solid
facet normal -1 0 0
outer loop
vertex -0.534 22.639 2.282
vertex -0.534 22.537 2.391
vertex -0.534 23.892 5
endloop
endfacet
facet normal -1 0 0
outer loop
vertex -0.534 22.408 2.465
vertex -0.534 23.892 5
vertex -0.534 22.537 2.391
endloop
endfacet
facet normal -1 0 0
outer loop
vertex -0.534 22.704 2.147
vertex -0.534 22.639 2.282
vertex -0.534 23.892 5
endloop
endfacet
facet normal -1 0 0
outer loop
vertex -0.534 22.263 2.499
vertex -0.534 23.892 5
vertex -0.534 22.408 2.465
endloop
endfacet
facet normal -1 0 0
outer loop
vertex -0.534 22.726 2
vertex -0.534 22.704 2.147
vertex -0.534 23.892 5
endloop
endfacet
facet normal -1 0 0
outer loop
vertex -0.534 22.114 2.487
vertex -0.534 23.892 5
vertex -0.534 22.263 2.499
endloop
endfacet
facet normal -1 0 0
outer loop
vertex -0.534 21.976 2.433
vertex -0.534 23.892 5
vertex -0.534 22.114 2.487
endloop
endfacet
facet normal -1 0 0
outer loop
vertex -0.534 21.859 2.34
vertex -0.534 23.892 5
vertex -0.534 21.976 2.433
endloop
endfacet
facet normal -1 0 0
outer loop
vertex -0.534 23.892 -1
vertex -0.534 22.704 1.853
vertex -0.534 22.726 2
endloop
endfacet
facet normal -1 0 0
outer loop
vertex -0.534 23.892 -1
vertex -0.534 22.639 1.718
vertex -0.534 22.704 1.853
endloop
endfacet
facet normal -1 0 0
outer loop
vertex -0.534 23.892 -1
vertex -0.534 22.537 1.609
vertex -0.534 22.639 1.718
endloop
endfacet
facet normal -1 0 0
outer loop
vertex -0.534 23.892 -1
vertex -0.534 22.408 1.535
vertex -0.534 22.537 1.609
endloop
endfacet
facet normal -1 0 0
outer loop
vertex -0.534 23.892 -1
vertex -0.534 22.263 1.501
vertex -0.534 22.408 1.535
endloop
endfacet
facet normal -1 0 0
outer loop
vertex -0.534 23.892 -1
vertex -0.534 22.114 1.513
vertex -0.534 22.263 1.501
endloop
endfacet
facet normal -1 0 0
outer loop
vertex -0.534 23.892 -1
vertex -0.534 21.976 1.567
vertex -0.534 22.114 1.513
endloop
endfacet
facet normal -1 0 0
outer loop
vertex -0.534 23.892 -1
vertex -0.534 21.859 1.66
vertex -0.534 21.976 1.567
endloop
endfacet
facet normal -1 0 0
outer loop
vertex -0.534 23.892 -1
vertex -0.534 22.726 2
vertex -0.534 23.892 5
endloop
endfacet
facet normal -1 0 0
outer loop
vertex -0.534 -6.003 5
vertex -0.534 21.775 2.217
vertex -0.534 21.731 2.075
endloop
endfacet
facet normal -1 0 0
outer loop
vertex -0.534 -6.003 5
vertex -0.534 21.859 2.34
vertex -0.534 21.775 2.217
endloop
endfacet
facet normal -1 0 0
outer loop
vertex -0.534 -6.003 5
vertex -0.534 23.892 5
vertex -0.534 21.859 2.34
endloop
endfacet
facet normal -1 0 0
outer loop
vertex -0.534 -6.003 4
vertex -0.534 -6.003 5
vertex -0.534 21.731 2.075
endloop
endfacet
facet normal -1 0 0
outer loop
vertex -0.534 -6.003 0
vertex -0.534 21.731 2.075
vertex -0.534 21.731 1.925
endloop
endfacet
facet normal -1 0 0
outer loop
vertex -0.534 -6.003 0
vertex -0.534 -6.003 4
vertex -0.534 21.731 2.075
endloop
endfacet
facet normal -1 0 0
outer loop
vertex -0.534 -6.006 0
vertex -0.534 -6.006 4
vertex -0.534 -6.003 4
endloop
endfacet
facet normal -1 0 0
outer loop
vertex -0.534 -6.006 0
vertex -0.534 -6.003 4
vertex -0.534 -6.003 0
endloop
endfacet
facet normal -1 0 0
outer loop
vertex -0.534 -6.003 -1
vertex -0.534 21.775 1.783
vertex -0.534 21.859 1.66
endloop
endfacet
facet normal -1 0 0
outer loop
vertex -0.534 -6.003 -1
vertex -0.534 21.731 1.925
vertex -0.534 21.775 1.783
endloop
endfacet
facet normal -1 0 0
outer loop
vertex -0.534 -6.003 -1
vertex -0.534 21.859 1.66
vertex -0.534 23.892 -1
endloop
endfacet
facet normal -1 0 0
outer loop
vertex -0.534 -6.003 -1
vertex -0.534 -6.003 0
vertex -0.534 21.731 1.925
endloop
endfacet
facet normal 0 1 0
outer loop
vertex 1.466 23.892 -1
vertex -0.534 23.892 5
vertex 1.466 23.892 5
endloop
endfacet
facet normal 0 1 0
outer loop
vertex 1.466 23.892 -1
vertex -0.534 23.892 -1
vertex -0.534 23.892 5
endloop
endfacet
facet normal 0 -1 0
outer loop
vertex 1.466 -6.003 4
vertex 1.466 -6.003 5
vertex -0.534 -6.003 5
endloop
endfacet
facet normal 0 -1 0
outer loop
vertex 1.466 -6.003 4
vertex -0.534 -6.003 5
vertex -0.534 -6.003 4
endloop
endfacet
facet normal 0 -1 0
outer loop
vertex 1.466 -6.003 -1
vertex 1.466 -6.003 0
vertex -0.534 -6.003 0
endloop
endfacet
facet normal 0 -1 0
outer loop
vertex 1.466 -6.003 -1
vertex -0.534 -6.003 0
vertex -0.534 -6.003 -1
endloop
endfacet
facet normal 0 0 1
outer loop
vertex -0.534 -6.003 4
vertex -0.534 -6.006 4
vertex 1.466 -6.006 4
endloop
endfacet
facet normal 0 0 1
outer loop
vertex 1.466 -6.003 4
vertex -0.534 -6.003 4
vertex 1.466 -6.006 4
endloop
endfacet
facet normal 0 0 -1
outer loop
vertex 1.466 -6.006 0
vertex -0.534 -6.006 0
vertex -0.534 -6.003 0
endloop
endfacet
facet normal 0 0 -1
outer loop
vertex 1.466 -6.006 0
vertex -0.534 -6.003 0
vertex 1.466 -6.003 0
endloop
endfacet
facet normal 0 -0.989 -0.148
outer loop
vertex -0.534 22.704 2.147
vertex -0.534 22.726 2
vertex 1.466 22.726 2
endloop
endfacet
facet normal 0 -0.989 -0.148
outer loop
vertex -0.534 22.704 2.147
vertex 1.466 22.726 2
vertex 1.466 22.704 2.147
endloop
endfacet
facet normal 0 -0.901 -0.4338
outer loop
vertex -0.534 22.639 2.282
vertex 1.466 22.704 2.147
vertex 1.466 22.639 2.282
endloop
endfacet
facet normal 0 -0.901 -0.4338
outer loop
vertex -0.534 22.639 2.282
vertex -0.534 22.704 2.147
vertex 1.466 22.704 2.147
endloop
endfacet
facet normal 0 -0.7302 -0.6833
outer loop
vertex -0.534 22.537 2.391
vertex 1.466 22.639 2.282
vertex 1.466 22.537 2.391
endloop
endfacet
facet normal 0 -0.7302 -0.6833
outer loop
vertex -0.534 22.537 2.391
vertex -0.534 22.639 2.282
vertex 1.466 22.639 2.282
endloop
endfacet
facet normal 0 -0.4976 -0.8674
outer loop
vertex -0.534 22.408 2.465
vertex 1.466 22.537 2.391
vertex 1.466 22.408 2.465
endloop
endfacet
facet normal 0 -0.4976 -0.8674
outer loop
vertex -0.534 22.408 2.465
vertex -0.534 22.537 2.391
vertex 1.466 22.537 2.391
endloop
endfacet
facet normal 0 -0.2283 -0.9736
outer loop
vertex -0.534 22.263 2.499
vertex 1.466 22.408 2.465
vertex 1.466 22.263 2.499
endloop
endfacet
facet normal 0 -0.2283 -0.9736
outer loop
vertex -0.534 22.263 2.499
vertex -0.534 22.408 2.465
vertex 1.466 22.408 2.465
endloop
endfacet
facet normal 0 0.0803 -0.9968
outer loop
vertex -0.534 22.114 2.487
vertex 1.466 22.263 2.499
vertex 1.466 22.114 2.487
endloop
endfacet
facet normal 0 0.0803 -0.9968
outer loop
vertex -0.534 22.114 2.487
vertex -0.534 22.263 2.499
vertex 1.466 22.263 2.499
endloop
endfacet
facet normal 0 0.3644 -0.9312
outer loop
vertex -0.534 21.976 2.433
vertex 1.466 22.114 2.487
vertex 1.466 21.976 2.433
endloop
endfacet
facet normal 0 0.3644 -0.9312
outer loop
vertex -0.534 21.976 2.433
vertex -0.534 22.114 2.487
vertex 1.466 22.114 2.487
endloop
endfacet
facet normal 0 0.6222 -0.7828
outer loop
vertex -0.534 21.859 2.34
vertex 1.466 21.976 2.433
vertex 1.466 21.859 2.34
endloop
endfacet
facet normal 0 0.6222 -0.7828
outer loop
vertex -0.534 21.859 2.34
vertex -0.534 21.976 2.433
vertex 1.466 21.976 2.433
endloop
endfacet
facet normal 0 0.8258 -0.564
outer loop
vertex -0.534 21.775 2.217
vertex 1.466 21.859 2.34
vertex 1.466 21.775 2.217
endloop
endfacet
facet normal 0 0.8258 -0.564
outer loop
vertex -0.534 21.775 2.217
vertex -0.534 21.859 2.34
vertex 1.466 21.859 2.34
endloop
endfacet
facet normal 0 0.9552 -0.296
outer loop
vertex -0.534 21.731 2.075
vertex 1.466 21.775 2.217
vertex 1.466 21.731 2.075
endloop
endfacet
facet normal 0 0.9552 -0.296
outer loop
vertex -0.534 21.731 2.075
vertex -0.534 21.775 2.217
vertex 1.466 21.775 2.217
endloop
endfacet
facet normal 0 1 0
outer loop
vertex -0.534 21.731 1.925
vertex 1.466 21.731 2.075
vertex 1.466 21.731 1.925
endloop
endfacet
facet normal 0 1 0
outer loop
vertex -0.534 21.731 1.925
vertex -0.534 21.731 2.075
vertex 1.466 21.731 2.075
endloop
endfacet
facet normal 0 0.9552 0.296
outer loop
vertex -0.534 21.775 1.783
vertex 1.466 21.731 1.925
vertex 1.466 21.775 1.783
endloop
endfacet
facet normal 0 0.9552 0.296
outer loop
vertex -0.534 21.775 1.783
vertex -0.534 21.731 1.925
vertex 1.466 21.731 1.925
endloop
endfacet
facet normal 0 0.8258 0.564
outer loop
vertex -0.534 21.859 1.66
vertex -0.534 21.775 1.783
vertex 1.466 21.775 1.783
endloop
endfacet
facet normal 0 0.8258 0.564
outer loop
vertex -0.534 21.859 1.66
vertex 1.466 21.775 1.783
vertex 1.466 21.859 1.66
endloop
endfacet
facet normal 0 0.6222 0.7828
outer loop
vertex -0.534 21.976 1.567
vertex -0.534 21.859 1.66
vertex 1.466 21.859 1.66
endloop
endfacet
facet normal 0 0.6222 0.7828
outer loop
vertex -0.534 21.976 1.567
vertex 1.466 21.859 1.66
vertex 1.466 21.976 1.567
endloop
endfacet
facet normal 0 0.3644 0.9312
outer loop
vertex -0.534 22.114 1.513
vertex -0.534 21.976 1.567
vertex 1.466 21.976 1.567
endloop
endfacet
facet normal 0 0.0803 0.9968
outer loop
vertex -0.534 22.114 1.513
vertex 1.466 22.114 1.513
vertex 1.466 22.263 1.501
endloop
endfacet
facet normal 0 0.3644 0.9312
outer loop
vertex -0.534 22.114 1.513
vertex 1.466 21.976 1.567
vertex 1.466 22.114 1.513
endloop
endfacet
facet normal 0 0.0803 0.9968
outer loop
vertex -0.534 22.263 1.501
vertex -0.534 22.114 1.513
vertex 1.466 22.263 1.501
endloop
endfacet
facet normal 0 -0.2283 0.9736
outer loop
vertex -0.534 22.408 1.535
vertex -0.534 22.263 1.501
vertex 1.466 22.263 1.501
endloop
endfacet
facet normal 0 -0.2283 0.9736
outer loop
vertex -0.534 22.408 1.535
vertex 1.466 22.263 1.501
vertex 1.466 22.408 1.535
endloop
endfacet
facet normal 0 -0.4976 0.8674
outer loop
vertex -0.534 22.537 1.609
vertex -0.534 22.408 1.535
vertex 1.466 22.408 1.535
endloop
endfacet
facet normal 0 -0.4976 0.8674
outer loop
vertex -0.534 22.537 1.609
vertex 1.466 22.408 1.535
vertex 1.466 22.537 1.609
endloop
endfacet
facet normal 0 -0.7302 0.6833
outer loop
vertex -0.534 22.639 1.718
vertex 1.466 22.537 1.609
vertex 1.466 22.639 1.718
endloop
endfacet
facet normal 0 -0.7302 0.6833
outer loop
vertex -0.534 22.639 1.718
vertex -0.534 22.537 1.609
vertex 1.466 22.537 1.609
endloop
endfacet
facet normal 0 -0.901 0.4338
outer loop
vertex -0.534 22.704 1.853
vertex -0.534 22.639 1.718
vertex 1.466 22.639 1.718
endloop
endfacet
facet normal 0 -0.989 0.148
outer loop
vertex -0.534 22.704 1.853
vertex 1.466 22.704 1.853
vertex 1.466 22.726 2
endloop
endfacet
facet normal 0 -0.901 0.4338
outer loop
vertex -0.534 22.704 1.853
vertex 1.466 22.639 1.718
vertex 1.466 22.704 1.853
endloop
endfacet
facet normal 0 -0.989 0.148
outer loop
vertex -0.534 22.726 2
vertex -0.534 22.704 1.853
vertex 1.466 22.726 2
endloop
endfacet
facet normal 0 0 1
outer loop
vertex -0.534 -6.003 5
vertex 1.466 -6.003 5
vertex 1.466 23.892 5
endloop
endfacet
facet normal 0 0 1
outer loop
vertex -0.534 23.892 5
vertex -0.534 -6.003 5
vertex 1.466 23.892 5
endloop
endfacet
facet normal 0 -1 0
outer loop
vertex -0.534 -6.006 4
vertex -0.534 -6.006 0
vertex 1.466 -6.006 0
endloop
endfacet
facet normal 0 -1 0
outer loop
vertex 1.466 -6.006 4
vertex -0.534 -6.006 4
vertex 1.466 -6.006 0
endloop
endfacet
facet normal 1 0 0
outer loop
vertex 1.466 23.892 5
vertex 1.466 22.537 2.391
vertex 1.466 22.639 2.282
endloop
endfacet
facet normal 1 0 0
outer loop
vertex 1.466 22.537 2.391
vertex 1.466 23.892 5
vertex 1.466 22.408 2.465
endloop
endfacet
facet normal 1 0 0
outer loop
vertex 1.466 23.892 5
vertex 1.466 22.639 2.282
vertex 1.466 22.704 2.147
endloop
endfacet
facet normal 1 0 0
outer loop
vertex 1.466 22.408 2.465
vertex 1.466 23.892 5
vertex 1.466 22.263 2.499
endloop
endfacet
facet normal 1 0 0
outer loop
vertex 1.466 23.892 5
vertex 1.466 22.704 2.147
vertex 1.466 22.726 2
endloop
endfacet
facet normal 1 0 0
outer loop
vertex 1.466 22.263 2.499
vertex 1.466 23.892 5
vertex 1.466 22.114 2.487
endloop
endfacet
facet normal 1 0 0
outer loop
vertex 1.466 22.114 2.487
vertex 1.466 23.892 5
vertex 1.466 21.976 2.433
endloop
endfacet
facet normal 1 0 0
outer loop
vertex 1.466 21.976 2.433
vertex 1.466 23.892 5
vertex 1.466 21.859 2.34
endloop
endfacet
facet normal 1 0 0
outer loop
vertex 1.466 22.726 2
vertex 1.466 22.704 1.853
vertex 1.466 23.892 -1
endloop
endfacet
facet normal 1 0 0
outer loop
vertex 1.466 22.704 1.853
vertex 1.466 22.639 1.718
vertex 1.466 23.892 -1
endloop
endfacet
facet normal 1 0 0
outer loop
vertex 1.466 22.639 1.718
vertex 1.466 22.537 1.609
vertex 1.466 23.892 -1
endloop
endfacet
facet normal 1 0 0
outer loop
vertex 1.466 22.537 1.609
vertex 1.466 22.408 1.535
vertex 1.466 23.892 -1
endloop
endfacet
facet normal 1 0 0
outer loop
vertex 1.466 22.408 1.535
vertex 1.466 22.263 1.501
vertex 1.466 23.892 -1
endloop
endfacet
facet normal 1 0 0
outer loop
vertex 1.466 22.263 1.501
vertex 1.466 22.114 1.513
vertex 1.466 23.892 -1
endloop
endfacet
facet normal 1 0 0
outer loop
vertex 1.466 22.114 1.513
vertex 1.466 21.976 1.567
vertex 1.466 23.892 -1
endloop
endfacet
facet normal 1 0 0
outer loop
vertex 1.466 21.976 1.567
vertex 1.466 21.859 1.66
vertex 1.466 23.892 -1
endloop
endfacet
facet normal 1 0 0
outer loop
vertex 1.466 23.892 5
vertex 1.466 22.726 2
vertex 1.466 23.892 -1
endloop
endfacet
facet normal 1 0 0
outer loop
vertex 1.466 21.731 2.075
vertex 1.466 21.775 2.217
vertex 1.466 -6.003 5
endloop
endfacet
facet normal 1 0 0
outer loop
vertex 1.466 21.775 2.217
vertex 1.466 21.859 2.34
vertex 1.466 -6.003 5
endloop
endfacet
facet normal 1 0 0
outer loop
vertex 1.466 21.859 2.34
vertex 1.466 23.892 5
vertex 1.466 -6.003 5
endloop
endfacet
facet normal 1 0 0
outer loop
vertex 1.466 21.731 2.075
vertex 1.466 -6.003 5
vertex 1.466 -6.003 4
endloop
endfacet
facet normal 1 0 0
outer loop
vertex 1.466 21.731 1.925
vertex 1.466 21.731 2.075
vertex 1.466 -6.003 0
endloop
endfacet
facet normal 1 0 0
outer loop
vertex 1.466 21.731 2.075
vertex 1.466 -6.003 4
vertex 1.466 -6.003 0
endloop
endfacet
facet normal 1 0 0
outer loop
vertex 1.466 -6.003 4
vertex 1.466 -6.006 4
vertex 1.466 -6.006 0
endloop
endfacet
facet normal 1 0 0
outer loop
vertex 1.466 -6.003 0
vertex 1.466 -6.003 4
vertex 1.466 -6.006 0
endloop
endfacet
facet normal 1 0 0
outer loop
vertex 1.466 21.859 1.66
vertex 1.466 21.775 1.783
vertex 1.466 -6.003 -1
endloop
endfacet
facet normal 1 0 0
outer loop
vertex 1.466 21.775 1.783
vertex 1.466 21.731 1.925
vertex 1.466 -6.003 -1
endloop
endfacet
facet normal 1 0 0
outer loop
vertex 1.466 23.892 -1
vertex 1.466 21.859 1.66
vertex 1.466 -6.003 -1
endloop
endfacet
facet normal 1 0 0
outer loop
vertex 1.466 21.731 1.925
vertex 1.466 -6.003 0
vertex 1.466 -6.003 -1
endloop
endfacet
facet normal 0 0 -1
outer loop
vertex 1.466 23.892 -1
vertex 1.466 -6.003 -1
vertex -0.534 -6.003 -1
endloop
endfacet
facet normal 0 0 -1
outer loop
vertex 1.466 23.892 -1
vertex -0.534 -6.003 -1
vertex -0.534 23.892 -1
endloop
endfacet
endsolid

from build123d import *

# Parameters (mm, degrees)
SKETCH1_W               = 2
SKETCH1_H               = 6.898115708
BOSS_EXTRUDE1_DEPTH     = 4
SKETCH2_W               = 2
SKETCH2_H               = 4
BOSS_EXTRUDE2_DEPTH     = 23
SKETCH3_W               = 4
SKETCH3_H               = 29.895089618
SKETCH3_R               = 0.5
SKETCH3_W_2             = 1
BOSS_EXTRUDE4_DEPTH     = 2
CUT_EXTRUDE1_DEPTH      = 25.491073296
CUT_EXTRUDE1_DEPTH_BACK = 25.491073296
SKETCH4_R               = 0.5


with BuildPart() as part:
    # Sketch1 → Boss-Extrude1 (new body)
    with BuildSketch(Plane.XY):
        with Locations((0.466430338, -2.557371618)):
            Rectangle(SKETCH1_W, SKETCH1_H)
    extrude(amount=BOSS_EXTRUDE1_DEPTH)

    # Sketch2 → Boss-Extrude2 (add)
    with BuildSketch(Plane(origin=(0, 0.891686236, 0), x_dir=(1, 0, 0), z_dir=(0, 1, 0))):
        with Locations((0.466430338, -2)):
            Rectangle(SKETCH2_W, SKETCH2_H)
    extrude(amount=BOSS_EXTRUDE2_DEPTH)

    # Sketch3 → Boss-Extrude4 (add, through all)
    # profile 1 of 3: a face of its own
    with BuildSketch(Plane(origin=(1.466430338, 0, 0), x_dir=(0, 0, -1), z_dir=(1, 0, 0))):
        with Locations((-2, 8.944141427)):
            Rectangle(SKETCH3_W, SKETCH3_H)
        with Locations((-2, 22.225736667)):
            Circle(SKETCH3_R, mode=Mode.SUBTRACT)
    # profile 2 of 3: a face of its own
    with BuildSketch(Plane(origin=(1.466430338, 0, 0), x_dir=(0, 0, -1), z_dir=(1, 0, 0))):
        with Locations((-4.5, 8.944141427)):
            Rectangle(SKETCH3_W_2, SKETCH3_H)
    # profile 3 of 3: a face of its own
    with BuildSketch(Plane(origin=(1.466430338, 0, 0), x_dir=(0, 0, -1), z_dir=(1, 0, 0))):
        with Locations((0.5, 8.944141427)):
            Rectangle(SKETCH3_W_2, SKETCH3_H)
    extrude(amount=-BOSS_EXTRUDE4_DEPTH)

    # Sketch4 → Cut-Extrude1 (cut, two sides: drawn at the far end of the back side and taken through both)
    with BuildSketch(Plane(origin=(1.466430338, 0, 0), x_dir=(0, 0, -1), z_dir=(1, 0, 0)).offset(-CUT_EXTRUDE1_DEPTH_BACK)):
        with Locations(Location((-2, 22.225736667, 0), (0, 0, 90))):
            Circle(SKETCH4_R)
    extrude(amount=CUT_EXTRUDE1_DEPTH + CUT_EXTRUDE1_DEPTH_BACK, mode=Mode.SUBTRACT)


solid = part.part
